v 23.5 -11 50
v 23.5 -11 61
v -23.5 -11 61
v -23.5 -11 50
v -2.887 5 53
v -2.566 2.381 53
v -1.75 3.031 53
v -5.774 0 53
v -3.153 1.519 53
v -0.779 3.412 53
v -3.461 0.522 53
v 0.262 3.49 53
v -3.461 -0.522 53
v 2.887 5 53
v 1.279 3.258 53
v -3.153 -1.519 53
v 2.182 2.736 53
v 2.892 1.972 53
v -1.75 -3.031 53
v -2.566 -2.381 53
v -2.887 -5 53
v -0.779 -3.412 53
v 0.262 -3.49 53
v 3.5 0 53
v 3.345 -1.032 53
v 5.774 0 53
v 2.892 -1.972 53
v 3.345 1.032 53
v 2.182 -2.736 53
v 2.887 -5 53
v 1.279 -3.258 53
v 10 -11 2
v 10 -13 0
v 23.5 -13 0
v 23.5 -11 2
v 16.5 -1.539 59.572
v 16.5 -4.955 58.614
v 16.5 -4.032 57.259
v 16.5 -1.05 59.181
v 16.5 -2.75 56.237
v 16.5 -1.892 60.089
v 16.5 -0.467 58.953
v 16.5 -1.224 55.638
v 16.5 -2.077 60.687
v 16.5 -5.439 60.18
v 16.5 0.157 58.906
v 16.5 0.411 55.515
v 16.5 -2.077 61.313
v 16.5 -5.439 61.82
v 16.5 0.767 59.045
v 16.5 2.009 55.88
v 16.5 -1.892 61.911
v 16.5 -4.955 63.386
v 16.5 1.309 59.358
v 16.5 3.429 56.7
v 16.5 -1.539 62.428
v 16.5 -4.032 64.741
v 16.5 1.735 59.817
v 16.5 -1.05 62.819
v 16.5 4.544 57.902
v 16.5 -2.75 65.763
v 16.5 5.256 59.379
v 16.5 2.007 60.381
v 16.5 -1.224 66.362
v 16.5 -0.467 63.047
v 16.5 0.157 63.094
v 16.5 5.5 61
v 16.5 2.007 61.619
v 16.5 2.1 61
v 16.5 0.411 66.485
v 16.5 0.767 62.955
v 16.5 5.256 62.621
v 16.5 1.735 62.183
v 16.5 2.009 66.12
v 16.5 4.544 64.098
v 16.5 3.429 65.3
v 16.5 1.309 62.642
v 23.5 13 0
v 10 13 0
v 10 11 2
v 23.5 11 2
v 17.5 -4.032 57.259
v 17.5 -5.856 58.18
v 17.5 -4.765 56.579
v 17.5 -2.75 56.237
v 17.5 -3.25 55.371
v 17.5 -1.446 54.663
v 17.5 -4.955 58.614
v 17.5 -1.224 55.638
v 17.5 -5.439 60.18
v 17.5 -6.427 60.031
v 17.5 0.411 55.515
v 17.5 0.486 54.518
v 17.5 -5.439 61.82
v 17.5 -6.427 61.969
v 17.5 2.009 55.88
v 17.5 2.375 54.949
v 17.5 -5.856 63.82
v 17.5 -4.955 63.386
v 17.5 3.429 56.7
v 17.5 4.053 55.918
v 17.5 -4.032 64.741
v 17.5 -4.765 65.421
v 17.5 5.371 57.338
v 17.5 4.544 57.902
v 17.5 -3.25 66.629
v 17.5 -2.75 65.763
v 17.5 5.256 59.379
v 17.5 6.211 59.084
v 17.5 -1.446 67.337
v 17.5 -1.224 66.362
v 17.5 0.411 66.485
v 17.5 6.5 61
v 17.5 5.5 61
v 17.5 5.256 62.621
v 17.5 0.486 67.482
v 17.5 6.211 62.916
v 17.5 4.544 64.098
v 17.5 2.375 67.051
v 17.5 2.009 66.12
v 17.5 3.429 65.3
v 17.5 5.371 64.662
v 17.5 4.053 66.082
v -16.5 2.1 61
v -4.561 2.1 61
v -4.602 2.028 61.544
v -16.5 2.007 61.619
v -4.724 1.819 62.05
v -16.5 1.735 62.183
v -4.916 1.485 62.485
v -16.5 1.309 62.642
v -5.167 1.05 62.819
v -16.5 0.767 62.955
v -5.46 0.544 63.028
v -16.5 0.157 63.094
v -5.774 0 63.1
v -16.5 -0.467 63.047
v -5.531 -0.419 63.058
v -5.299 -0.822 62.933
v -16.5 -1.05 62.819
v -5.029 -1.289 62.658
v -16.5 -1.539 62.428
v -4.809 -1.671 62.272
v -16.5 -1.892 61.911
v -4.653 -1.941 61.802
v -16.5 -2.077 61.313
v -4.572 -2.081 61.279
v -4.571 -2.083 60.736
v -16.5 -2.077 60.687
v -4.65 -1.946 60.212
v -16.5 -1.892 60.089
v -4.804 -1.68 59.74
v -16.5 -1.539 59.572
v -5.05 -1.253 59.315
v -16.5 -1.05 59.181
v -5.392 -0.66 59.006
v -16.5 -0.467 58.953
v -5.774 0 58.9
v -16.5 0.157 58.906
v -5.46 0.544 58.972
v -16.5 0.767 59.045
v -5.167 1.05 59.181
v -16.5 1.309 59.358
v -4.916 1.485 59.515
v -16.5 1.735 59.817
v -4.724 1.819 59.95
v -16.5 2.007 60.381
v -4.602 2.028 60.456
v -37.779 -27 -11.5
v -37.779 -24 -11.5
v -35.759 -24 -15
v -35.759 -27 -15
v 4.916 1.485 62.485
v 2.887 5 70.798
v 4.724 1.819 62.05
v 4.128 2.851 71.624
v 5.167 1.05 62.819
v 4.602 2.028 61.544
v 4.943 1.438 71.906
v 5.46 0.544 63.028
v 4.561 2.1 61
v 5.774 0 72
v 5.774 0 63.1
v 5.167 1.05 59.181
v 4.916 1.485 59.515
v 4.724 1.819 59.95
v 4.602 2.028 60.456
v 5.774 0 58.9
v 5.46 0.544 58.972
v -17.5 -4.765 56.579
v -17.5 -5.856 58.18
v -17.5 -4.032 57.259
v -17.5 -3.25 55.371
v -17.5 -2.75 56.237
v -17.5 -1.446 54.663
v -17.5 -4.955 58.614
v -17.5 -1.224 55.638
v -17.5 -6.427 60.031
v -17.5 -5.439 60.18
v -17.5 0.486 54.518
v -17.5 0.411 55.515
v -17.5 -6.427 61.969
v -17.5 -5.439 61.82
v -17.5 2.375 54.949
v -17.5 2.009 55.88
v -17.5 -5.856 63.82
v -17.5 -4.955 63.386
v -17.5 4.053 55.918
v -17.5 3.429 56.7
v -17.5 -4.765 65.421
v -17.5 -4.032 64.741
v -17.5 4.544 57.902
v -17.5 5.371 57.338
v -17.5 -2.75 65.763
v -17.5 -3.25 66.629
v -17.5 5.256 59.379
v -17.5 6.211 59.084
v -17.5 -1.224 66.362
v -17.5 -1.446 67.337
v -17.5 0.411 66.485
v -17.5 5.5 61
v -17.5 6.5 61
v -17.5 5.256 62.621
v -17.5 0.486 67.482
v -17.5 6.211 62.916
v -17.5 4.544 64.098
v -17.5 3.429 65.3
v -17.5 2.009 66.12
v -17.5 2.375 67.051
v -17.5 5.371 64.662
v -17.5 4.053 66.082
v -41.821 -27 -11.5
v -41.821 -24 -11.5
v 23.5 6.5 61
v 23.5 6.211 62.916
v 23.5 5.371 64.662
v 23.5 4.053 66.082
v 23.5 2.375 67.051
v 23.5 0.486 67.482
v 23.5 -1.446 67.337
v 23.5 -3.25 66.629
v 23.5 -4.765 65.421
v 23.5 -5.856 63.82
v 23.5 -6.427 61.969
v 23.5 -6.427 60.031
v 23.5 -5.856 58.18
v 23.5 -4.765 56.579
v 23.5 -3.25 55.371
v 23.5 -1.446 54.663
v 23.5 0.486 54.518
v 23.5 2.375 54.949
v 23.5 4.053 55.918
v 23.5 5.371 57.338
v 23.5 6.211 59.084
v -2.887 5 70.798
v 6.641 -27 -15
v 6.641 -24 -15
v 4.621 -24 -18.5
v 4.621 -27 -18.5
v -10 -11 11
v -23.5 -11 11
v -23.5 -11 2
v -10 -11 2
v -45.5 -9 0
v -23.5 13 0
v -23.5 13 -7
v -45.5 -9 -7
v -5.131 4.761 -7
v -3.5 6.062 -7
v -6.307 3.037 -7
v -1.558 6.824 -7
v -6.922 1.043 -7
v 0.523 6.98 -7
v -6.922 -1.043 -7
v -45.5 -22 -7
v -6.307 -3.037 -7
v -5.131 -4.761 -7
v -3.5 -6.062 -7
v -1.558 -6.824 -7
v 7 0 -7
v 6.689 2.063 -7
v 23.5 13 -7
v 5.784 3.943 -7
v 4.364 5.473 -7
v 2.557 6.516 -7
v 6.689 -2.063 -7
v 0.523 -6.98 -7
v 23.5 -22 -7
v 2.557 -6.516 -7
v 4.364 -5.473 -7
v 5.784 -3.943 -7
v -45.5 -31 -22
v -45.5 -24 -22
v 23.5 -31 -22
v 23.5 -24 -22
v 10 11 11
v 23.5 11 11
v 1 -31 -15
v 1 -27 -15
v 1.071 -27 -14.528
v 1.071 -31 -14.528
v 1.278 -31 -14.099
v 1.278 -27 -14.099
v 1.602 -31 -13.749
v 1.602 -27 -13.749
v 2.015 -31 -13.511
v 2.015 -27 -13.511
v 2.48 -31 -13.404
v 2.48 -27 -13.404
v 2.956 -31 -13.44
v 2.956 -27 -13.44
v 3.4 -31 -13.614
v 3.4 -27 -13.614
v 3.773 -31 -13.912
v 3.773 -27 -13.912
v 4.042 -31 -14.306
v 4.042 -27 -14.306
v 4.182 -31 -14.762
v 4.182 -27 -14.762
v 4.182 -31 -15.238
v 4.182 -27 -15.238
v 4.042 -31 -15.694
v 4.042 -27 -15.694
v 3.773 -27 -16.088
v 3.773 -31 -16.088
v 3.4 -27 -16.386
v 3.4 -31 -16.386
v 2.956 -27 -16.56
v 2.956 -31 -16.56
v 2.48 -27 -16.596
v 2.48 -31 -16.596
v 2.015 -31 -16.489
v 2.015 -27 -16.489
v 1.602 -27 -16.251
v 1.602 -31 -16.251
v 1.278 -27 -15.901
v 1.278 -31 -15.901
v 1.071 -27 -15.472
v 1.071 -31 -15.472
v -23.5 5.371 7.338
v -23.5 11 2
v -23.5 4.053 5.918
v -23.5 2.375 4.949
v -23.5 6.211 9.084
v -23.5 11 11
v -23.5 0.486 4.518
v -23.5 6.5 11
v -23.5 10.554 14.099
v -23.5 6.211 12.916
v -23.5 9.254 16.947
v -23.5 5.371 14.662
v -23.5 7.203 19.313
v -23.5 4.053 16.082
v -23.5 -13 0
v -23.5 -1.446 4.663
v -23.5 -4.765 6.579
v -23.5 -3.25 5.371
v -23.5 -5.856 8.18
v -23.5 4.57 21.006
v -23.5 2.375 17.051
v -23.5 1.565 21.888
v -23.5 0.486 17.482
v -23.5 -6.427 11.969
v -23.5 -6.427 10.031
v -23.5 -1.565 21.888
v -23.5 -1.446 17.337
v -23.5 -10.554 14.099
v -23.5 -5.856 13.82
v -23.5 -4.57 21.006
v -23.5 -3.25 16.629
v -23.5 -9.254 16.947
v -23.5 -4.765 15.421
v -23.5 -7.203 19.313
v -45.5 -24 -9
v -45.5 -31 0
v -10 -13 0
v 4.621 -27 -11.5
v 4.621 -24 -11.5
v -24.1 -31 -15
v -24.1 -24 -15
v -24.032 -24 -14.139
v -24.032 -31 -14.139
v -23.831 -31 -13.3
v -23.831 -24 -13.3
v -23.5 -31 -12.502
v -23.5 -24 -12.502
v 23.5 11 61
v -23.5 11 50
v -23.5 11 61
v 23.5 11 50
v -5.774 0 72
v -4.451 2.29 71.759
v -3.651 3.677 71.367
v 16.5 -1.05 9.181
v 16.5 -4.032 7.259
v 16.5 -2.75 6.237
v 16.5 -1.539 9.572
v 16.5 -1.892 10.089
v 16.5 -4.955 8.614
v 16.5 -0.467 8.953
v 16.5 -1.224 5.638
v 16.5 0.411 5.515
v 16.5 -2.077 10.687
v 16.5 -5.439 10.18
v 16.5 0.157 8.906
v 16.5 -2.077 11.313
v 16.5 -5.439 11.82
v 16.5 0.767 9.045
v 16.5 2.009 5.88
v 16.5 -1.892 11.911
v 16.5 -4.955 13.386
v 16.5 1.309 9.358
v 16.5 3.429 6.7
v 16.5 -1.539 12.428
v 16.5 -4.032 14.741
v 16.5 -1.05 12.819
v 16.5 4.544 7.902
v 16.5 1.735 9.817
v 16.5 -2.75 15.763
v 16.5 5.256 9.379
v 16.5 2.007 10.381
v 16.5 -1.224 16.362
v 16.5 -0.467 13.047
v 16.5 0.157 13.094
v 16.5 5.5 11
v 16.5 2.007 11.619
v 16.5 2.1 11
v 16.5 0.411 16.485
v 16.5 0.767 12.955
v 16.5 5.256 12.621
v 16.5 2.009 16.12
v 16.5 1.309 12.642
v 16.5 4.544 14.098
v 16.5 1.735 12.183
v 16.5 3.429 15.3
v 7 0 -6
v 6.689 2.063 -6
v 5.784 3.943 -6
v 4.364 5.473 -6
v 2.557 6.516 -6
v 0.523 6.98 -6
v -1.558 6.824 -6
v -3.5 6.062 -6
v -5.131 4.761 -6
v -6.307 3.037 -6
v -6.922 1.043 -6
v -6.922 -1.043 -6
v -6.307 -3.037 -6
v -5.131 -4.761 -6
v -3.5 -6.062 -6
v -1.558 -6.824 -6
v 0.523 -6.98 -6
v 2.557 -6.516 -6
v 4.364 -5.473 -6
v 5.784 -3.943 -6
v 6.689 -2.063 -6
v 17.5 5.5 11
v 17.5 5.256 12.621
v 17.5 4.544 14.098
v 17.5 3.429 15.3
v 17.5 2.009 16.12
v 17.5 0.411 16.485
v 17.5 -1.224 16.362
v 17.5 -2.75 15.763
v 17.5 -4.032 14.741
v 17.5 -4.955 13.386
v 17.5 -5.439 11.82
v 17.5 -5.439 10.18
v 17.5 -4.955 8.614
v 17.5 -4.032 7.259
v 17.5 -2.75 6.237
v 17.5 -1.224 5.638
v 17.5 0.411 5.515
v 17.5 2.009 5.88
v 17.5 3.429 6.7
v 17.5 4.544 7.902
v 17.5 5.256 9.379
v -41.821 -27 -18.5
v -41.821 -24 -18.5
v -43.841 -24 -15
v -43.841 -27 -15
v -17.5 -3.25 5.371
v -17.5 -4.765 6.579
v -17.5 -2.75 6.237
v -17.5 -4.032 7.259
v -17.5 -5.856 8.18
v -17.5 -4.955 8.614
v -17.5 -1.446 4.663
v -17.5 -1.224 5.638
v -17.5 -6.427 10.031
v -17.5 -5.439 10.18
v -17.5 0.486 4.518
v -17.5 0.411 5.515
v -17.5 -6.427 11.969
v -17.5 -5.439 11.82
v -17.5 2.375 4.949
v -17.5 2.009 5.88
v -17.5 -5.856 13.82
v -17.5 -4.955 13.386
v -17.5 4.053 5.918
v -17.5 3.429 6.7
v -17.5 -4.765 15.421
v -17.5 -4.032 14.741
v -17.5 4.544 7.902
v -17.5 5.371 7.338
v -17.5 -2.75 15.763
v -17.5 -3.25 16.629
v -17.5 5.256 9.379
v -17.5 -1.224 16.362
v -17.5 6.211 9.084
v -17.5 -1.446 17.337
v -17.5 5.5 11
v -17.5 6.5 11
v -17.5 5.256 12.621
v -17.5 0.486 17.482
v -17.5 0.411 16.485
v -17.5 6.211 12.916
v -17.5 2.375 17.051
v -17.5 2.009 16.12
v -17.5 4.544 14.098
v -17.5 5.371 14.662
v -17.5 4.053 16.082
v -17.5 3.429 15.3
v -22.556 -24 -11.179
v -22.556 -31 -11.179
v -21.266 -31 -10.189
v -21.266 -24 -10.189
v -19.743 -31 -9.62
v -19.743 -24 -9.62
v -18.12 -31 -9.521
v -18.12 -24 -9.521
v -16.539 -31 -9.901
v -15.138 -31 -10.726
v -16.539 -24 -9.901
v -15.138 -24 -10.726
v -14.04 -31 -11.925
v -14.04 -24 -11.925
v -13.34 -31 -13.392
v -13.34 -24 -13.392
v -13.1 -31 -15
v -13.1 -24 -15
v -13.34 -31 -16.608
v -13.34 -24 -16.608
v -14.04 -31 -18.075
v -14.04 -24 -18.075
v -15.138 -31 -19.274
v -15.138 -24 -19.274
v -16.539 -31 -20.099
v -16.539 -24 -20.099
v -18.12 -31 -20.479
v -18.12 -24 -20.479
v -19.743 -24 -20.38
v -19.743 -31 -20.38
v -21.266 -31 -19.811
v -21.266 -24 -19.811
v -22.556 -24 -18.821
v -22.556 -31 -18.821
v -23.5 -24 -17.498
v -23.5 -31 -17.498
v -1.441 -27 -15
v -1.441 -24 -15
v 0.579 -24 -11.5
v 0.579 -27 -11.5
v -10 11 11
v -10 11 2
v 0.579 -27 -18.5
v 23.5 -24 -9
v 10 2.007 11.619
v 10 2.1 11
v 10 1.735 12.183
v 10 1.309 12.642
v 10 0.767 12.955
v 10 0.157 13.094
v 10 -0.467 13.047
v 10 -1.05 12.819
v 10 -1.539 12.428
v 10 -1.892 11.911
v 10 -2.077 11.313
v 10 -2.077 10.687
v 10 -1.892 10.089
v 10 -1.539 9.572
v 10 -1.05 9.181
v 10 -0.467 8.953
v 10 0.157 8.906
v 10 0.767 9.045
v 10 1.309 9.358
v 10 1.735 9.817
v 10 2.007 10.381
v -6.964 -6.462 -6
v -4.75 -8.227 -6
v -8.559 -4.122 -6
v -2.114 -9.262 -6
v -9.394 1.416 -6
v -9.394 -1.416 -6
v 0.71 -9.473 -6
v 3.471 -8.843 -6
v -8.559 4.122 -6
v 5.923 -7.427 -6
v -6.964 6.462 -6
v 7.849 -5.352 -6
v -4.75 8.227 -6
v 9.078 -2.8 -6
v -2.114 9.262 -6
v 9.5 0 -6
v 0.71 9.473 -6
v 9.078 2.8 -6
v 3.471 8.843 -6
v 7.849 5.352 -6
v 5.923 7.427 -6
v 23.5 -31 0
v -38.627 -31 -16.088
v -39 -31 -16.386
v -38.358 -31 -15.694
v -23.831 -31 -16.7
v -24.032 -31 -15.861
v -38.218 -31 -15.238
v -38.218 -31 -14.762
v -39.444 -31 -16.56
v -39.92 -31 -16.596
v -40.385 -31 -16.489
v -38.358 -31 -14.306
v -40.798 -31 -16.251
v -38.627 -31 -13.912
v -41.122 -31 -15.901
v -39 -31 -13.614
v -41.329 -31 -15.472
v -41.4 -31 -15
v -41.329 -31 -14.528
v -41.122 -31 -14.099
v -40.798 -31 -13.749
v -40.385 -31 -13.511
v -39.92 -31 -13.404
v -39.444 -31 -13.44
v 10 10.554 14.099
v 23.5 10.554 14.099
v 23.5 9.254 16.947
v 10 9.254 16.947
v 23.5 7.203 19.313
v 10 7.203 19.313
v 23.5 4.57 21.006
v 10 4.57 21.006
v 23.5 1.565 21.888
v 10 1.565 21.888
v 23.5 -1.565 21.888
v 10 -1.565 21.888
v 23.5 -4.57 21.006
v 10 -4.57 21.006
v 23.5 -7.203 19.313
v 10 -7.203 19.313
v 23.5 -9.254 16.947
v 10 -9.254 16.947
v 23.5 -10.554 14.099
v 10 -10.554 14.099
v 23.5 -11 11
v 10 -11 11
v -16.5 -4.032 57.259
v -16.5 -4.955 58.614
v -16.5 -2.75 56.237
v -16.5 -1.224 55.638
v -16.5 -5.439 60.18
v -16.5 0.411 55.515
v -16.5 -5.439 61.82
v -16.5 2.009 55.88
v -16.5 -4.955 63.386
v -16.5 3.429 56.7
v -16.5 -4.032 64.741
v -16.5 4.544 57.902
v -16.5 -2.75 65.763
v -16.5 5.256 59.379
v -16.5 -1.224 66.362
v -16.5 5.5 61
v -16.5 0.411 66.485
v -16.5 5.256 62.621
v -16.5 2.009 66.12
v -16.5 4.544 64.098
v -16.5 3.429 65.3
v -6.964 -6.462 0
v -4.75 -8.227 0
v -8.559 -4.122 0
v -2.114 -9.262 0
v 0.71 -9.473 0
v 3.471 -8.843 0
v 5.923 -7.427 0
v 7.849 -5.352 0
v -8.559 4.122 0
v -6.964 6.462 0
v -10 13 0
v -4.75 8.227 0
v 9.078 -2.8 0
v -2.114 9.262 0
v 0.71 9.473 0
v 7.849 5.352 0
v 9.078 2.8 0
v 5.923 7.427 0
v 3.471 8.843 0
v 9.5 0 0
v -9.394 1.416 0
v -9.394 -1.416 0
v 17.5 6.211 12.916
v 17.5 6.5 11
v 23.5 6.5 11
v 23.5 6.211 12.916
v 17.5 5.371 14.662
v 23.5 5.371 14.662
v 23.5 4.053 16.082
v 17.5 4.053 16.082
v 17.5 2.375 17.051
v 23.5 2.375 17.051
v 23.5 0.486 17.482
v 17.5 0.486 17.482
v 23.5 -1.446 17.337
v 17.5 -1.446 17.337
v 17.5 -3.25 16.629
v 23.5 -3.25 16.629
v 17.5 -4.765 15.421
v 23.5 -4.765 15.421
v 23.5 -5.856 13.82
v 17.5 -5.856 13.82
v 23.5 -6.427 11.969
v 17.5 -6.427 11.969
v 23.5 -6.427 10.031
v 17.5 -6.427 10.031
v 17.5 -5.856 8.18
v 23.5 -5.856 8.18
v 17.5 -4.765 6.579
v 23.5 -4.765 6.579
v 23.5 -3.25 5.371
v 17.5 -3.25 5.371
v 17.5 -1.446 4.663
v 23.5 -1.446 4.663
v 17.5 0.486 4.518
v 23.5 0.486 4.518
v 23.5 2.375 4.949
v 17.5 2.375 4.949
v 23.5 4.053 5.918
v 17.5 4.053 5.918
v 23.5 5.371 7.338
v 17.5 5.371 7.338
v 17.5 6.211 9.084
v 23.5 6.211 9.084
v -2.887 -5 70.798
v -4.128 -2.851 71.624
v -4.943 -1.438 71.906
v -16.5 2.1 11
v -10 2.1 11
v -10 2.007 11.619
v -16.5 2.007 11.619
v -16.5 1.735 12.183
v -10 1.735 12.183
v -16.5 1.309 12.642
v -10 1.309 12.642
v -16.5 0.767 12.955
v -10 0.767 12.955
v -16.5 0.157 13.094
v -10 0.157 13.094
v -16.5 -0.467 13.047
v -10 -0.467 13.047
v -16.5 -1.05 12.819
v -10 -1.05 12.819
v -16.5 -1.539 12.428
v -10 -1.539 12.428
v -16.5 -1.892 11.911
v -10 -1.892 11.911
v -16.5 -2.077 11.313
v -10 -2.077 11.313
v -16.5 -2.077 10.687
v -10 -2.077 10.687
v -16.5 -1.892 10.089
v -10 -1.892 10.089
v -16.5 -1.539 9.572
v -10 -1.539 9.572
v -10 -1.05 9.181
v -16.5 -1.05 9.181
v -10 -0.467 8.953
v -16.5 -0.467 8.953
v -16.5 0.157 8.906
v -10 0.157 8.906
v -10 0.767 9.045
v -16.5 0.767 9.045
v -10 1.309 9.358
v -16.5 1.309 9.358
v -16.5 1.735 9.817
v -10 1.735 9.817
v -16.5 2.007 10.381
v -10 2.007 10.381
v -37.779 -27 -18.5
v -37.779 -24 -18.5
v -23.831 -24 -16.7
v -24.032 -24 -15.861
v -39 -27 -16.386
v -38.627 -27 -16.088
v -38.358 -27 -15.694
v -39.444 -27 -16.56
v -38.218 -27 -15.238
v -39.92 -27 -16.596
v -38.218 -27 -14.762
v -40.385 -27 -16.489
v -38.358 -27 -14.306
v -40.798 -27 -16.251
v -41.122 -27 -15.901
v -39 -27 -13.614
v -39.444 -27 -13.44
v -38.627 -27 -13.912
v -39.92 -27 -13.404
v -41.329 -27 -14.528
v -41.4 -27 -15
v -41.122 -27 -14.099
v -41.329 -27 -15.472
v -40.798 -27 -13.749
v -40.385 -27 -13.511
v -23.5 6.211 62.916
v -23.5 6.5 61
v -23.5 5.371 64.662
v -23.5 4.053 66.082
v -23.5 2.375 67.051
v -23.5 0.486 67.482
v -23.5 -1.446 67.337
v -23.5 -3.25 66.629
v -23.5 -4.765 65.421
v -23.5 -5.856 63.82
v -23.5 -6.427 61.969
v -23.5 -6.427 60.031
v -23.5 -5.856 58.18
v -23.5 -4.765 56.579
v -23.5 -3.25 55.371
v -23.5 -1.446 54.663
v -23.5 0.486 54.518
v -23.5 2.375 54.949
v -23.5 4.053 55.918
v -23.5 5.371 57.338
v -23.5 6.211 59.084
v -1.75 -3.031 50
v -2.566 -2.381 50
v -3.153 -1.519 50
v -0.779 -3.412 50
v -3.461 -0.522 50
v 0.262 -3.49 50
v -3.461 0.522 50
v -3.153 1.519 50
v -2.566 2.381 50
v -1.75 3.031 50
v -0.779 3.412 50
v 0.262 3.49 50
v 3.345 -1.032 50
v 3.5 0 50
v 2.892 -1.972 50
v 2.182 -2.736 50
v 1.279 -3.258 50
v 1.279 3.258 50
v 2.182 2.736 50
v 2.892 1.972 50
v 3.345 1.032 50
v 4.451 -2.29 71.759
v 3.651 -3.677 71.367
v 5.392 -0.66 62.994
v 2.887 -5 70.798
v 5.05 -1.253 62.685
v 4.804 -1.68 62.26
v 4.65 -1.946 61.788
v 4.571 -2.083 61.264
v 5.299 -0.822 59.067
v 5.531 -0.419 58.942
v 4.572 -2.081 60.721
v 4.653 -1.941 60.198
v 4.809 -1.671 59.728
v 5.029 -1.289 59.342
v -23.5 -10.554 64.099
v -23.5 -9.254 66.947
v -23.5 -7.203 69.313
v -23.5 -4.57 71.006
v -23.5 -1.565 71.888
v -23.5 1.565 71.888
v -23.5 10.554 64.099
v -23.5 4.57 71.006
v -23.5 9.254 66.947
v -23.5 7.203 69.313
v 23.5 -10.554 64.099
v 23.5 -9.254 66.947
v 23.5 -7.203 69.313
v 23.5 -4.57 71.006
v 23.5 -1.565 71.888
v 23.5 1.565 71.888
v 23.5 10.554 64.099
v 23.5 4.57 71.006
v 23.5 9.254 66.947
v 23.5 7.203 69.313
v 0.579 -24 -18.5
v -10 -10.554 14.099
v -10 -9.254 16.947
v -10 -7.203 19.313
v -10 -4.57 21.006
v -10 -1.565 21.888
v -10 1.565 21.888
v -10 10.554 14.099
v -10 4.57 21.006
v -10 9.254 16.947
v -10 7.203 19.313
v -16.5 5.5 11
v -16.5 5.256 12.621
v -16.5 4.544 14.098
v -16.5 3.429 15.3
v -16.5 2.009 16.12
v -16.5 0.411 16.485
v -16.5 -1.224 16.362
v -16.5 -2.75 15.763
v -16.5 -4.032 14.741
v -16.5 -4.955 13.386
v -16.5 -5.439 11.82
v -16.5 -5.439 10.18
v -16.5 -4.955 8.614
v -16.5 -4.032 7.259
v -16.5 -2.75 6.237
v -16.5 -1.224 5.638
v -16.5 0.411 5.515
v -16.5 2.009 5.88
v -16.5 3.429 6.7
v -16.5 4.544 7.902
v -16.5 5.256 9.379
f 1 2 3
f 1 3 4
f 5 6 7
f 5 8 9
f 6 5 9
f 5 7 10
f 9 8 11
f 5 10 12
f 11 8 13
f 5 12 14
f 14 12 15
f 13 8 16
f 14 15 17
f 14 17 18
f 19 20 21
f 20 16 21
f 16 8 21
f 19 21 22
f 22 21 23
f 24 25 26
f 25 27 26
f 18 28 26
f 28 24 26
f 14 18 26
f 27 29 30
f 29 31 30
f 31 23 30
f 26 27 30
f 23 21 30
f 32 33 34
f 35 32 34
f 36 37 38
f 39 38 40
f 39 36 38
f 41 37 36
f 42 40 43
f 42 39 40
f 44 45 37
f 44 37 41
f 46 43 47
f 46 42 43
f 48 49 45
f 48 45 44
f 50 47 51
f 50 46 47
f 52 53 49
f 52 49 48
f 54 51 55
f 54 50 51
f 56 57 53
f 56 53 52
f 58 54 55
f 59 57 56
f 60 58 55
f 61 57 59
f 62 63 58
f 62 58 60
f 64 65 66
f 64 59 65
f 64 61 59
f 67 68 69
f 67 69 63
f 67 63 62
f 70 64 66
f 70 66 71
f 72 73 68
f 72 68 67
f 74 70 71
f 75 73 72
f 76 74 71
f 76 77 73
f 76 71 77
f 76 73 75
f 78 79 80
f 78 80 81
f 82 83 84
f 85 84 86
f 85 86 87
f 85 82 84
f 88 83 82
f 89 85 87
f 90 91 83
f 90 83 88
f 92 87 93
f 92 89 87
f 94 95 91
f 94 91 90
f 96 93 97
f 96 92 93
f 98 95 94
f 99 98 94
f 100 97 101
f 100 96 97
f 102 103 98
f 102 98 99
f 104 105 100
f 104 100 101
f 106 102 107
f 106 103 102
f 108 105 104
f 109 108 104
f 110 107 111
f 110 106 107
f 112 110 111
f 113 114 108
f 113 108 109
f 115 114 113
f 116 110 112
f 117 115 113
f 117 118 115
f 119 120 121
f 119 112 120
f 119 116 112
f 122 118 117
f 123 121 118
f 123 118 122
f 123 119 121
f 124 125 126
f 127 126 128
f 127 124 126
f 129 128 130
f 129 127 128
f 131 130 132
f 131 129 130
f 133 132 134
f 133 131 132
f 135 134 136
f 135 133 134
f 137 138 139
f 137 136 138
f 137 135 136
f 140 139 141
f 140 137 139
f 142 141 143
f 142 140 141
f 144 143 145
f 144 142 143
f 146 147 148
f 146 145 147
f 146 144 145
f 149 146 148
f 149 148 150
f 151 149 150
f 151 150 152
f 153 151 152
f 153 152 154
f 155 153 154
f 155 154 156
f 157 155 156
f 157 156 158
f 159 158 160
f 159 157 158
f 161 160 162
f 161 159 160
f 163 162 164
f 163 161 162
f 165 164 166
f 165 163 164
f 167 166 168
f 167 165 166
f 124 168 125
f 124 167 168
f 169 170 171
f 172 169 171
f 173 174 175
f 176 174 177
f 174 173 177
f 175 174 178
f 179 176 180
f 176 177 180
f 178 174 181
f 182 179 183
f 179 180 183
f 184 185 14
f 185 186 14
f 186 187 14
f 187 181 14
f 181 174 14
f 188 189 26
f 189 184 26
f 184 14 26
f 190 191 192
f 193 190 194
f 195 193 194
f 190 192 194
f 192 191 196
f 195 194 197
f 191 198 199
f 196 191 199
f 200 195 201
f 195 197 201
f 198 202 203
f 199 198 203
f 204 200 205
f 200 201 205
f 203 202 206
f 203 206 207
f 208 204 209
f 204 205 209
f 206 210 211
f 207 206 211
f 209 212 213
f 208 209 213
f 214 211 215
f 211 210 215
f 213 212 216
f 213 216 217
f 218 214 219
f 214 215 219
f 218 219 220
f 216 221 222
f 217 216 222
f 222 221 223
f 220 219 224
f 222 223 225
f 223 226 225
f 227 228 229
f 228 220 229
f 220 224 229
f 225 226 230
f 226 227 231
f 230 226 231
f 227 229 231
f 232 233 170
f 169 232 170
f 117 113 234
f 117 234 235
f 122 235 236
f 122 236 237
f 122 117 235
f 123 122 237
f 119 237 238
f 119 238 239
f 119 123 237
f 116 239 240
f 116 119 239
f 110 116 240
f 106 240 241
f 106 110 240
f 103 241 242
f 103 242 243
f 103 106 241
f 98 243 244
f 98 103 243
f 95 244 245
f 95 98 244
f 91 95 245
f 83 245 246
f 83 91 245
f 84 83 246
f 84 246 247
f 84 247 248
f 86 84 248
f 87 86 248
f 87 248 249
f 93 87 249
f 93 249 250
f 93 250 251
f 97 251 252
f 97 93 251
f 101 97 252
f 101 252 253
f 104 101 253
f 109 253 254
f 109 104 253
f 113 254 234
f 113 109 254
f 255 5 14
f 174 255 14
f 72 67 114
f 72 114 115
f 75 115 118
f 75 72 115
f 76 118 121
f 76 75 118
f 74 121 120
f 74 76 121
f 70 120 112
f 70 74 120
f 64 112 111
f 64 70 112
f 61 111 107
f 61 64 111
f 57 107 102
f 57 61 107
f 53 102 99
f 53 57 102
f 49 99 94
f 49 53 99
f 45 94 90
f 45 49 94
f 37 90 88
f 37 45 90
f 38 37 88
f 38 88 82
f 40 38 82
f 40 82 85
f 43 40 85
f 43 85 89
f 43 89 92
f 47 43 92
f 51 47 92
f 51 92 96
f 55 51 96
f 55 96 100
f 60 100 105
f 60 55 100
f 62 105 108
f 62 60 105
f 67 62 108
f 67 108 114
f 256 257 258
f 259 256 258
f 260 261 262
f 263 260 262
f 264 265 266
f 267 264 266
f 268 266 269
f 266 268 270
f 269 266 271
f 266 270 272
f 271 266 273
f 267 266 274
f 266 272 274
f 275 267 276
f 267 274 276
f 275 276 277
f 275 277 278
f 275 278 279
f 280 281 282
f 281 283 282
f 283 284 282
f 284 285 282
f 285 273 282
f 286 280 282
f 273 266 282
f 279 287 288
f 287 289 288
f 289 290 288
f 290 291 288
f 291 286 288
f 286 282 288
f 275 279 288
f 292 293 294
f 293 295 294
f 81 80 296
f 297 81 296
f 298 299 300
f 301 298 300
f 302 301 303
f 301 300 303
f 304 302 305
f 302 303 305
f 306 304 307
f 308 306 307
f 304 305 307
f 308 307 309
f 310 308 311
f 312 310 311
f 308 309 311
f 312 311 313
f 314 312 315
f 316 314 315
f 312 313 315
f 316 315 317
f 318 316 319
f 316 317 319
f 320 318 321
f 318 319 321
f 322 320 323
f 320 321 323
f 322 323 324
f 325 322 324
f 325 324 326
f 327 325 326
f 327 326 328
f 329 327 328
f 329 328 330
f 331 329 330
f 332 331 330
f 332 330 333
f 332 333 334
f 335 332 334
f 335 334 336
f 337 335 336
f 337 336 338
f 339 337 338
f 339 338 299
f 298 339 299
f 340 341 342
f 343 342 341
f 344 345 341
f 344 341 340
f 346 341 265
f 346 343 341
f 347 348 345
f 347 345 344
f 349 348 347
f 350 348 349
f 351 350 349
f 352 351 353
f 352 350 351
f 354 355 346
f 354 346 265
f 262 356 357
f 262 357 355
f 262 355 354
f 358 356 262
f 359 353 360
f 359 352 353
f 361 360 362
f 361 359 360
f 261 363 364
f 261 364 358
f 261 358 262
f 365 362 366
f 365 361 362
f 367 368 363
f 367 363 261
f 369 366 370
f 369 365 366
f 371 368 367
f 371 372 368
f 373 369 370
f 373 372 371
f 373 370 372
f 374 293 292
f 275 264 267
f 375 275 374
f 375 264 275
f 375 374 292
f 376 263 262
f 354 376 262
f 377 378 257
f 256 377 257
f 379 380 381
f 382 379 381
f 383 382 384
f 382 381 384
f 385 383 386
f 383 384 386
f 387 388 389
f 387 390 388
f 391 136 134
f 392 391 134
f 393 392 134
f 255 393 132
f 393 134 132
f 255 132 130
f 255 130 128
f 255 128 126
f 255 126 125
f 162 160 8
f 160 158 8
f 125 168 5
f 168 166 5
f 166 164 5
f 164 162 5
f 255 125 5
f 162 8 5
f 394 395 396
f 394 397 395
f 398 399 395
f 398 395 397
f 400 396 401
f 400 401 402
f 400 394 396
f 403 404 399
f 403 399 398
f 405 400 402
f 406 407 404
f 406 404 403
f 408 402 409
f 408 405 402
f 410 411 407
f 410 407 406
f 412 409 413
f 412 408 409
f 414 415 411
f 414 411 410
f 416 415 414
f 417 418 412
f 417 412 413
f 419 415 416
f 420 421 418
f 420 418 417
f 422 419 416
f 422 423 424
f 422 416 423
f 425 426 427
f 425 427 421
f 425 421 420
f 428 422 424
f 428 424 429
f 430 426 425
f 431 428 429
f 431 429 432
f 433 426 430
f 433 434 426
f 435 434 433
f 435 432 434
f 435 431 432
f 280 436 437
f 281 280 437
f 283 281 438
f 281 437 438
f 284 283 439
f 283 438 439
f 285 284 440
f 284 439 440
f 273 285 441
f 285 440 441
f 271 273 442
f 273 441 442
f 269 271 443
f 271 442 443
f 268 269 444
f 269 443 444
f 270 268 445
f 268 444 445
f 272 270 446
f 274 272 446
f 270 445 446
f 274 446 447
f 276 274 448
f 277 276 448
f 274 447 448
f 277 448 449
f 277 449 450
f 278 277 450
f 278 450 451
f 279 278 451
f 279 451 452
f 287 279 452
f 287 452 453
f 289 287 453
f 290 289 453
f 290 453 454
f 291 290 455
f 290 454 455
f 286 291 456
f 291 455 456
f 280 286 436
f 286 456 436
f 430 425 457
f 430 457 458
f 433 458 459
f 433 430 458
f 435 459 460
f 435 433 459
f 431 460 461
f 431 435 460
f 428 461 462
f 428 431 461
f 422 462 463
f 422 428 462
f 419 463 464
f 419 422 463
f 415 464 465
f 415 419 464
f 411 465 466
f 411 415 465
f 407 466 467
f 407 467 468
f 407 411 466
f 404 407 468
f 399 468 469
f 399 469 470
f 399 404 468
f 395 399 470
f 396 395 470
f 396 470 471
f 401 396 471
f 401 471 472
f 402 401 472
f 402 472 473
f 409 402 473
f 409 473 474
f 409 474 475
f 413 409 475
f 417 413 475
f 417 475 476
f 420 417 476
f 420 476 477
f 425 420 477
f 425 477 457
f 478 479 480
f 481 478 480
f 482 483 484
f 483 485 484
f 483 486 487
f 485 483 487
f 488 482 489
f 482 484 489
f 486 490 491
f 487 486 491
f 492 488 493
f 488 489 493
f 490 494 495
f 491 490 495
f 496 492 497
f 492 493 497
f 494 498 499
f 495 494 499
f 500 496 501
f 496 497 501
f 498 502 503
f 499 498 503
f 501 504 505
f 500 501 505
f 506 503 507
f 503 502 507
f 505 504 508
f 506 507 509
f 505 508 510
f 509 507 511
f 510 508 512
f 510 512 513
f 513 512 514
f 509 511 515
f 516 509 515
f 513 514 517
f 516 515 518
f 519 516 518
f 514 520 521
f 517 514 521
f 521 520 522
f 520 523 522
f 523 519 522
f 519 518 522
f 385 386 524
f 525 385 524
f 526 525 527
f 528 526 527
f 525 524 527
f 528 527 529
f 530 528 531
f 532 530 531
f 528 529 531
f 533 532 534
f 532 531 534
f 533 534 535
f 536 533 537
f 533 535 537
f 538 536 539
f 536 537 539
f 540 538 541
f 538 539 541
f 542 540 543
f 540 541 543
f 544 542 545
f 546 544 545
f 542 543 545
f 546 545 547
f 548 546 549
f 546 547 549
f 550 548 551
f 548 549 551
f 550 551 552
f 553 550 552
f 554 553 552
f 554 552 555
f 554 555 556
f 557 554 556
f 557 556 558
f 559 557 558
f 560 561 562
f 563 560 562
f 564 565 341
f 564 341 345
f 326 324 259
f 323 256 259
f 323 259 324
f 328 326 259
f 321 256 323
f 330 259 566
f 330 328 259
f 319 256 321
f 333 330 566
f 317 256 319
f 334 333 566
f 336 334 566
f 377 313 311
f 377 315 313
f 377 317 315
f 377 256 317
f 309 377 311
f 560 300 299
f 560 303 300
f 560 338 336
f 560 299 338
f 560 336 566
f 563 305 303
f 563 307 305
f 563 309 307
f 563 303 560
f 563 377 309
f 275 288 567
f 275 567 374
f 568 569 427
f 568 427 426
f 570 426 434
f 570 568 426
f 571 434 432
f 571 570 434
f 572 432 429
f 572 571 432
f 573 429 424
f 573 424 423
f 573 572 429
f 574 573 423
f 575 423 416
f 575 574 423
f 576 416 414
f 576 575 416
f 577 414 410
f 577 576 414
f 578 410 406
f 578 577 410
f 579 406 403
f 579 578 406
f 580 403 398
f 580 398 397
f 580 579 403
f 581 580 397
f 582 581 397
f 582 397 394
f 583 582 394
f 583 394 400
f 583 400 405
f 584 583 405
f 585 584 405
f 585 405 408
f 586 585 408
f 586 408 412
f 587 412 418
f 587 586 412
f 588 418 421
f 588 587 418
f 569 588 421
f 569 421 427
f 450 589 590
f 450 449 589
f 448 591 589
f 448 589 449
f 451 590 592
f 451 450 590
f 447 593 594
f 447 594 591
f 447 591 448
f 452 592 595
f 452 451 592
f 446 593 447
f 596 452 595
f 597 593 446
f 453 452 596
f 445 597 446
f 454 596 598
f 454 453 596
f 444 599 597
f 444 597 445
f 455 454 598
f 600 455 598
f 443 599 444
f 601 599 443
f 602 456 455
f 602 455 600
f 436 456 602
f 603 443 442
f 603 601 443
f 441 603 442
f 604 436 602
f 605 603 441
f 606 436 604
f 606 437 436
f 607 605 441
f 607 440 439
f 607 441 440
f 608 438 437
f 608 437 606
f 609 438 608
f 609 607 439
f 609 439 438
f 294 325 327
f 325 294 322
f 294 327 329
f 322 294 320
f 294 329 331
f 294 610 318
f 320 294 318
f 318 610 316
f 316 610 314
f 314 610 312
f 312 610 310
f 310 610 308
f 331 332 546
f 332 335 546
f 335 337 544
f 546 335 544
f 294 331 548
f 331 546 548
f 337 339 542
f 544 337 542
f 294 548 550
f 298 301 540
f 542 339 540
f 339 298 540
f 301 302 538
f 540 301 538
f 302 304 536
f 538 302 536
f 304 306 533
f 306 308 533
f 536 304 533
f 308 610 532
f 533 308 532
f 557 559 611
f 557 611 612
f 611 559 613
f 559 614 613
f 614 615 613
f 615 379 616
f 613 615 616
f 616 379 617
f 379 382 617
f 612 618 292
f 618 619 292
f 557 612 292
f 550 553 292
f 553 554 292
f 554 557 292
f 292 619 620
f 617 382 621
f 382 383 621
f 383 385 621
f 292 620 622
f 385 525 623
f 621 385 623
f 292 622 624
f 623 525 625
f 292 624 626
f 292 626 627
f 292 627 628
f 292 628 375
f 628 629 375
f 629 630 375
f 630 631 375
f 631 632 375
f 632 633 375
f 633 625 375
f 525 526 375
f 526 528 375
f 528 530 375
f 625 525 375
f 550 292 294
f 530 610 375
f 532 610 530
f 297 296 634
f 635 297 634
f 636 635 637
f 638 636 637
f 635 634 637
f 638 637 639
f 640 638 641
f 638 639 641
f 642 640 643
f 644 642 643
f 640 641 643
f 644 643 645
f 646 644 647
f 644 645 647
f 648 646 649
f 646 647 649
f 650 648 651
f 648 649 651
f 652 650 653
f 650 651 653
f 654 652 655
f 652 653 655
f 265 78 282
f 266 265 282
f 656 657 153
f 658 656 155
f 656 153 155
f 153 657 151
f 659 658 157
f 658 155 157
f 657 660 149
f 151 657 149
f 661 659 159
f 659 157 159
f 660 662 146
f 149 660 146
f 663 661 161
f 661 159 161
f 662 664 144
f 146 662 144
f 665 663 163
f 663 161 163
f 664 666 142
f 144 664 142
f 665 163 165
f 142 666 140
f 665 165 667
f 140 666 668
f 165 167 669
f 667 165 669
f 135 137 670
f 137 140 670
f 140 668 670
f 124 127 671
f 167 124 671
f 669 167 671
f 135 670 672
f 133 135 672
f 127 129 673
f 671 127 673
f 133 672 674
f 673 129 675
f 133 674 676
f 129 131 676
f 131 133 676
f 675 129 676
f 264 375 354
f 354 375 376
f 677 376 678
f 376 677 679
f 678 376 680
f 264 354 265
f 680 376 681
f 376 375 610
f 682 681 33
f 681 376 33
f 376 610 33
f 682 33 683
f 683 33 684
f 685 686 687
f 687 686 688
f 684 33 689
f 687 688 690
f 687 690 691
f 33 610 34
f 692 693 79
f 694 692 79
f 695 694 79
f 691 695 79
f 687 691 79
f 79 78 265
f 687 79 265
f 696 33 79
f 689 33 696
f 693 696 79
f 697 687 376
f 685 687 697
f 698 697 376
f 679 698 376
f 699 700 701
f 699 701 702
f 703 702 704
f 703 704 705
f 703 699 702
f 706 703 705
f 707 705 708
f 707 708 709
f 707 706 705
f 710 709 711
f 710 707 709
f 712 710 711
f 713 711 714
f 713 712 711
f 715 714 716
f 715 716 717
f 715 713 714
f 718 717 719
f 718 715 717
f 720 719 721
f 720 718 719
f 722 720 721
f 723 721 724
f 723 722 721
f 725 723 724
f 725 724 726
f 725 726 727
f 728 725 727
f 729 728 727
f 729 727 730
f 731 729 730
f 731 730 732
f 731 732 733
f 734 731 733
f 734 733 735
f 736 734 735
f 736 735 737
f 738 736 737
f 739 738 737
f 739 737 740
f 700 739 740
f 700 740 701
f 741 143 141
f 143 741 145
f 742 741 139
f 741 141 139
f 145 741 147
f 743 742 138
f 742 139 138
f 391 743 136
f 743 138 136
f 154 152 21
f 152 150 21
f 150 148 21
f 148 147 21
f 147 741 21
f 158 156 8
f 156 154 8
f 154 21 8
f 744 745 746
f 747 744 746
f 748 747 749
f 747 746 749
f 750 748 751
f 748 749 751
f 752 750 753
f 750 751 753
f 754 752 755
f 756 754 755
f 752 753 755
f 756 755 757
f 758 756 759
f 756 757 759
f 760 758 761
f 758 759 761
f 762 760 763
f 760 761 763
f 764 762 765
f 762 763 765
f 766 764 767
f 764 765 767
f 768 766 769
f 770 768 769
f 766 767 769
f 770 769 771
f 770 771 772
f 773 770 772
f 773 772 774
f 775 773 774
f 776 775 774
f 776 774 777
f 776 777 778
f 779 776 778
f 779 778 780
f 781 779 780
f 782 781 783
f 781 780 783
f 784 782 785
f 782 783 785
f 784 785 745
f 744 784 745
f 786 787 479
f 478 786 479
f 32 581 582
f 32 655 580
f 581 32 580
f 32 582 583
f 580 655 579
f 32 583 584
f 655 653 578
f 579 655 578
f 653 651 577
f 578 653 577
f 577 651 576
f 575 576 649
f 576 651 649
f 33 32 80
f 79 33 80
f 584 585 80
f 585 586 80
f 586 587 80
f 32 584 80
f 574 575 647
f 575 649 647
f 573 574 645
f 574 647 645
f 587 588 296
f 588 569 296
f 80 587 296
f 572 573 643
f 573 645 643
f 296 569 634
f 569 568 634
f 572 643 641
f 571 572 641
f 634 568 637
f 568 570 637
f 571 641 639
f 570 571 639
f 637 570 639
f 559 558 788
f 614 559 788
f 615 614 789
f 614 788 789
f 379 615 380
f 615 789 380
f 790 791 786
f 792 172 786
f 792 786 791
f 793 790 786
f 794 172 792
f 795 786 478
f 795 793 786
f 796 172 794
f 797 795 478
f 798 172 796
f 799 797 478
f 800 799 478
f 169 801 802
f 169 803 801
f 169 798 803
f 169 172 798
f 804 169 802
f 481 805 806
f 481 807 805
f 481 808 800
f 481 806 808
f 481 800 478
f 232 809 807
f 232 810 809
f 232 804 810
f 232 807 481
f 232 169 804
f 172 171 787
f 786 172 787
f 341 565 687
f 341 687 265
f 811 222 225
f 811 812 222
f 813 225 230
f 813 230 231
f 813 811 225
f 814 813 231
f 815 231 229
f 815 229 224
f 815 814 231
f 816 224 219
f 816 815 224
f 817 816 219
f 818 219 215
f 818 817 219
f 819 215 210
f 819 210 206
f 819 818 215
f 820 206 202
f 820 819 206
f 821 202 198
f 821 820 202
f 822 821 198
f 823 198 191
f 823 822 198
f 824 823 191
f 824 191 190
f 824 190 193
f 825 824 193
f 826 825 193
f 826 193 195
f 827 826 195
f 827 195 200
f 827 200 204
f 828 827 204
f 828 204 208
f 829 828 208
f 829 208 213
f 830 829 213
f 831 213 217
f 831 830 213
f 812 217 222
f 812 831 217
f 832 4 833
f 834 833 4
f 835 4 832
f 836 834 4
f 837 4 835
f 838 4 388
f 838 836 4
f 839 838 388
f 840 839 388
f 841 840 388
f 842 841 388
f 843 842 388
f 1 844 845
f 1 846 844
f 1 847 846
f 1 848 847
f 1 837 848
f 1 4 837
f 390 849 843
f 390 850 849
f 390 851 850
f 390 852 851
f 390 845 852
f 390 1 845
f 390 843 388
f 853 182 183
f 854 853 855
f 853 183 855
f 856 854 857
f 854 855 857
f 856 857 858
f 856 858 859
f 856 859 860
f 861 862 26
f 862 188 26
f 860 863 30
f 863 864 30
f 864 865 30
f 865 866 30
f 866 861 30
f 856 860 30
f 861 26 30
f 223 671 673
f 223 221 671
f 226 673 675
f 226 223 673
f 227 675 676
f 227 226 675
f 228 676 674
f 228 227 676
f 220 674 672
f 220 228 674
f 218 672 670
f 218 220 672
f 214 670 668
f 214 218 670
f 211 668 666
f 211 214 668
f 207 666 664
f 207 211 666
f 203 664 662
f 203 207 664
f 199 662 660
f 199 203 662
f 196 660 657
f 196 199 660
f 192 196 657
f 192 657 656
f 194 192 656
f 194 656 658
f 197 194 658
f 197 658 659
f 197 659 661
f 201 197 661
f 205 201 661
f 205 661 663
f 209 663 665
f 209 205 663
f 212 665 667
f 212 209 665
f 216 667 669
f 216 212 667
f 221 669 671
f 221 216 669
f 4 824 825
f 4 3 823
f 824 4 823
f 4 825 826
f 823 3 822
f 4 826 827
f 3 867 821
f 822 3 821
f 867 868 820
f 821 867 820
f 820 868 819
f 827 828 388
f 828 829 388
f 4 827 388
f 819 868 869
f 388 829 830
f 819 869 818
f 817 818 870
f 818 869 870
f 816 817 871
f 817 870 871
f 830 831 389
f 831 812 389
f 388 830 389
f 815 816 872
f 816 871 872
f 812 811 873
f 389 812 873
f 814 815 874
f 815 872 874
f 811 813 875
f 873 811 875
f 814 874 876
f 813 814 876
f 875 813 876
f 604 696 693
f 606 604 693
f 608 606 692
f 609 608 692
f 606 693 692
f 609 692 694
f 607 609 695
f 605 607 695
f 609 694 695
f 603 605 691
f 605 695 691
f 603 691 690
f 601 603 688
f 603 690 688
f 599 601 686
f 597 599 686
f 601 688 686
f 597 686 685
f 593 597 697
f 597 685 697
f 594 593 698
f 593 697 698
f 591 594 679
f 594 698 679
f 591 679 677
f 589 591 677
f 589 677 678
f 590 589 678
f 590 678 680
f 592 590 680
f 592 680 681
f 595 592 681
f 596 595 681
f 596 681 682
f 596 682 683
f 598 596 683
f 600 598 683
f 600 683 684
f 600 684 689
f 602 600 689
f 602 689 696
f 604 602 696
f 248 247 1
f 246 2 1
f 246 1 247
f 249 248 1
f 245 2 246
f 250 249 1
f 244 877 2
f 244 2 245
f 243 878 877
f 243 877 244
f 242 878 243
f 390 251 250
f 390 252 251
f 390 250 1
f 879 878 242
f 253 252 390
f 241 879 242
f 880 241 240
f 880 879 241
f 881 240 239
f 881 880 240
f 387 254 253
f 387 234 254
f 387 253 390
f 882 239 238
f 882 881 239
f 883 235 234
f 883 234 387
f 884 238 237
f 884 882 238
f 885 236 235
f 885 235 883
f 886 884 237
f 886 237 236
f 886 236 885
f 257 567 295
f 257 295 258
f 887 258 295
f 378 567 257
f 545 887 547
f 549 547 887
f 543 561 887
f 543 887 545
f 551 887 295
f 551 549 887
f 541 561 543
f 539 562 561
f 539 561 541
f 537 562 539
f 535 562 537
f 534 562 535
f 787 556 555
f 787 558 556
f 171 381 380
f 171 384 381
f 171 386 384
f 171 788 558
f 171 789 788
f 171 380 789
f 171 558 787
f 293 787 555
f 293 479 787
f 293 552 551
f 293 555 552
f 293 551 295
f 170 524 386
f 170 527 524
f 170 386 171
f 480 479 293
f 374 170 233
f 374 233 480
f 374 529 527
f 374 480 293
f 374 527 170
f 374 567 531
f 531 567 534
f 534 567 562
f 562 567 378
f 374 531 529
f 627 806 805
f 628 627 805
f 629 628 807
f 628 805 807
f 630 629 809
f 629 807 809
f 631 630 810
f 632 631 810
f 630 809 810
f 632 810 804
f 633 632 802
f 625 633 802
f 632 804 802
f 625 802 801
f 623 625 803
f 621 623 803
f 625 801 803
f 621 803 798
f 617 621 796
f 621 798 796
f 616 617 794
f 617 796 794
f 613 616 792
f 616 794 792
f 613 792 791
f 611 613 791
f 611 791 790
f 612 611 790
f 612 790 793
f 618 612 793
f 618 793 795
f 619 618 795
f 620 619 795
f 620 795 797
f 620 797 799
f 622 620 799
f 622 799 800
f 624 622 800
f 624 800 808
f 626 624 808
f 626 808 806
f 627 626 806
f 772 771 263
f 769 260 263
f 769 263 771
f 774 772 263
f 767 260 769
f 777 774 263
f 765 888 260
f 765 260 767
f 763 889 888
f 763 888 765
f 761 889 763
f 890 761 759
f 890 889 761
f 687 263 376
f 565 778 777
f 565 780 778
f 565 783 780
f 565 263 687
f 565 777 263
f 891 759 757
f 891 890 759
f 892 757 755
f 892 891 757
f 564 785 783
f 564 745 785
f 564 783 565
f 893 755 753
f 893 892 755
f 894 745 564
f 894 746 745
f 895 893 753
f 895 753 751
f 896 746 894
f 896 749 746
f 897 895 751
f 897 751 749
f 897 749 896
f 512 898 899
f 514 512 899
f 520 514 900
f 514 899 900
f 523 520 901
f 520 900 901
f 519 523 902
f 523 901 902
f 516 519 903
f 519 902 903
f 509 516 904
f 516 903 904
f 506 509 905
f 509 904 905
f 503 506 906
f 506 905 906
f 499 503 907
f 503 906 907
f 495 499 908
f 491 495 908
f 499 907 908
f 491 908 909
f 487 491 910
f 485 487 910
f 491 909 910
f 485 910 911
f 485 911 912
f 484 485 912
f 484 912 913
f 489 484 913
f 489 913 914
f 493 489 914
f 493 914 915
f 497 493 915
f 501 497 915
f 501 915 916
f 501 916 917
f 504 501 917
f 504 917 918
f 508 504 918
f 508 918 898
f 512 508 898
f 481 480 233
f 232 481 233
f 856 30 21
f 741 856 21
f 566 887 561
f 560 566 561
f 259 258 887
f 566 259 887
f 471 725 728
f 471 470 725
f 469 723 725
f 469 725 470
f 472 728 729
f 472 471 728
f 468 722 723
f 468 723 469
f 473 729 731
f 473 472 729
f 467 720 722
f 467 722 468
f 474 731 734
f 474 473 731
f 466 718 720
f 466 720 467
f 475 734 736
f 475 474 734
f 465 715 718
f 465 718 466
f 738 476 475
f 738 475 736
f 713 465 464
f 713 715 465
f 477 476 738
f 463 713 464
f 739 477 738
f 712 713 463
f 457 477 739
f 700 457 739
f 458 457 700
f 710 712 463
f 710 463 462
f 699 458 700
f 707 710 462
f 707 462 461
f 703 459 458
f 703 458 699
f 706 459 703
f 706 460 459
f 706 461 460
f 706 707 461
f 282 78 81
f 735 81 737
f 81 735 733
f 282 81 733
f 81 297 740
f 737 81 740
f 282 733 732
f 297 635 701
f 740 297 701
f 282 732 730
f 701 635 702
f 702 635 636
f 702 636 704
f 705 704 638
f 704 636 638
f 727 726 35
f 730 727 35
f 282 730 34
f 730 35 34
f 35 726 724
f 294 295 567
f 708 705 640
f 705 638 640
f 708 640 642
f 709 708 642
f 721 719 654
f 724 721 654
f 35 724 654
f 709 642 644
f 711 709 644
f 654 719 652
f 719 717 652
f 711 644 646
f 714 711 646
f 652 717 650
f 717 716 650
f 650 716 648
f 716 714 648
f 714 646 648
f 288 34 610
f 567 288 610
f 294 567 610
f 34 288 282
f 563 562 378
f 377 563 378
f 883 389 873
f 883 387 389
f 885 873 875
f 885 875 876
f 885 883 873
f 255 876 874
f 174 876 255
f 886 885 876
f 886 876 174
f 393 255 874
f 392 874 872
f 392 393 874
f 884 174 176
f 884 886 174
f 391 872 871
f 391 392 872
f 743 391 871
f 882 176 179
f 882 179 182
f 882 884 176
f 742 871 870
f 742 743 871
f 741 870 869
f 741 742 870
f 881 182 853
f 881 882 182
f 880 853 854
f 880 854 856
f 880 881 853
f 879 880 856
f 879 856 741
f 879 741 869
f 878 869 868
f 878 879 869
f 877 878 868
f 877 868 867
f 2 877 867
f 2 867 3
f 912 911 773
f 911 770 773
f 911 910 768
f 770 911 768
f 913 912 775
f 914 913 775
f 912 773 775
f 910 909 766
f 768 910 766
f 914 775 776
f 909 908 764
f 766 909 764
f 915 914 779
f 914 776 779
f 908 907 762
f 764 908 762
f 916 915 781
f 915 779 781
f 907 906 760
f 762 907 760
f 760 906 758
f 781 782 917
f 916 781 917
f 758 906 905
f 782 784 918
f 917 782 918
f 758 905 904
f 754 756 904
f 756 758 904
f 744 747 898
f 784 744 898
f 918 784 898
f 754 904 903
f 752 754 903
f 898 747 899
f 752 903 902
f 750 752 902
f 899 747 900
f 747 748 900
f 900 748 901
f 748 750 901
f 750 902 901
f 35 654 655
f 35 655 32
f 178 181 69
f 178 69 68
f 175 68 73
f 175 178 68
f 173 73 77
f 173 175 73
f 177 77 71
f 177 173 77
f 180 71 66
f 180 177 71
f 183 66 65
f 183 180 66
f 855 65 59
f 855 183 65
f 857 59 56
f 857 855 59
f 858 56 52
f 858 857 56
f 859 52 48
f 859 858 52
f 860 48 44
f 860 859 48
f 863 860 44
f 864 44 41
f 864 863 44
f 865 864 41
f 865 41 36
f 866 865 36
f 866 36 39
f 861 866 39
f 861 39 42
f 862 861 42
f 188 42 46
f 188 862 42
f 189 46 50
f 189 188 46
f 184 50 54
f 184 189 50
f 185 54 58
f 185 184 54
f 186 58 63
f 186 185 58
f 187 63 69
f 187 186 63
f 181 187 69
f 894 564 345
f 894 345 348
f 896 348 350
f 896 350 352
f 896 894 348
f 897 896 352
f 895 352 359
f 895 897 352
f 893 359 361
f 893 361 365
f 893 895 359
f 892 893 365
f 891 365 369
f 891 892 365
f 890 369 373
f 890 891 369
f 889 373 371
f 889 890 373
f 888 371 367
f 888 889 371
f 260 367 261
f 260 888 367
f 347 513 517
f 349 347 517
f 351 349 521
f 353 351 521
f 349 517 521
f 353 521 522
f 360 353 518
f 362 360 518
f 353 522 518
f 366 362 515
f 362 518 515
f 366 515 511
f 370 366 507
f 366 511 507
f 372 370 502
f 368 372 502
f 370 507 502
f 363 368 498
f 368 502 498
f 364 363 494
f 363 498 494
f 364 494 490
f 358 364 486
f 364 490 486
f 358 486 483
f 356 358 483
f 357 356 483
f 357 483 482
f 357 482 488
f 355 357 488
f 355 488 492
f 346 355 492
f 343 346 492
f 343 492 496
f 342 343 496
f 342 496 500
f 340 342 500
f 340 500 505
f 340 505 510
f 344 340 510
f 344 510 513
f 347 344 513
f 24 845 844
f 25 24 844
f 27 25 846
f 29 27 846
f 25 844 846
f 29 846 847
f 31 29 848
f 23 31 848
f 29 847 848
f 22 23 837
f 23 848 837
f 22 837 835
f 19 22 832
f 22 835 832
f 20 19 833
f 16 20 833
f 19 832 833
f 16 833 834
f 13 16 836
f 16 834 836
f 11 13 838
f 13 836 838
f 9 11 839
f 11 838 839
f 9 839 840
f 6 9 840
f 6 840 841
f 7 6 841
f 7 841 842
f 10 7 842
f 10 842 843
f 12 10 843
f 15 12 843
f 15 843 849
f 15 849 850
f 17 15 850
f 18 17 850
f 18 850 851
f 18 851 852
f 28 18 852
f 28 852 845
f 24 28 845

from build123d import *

# Parameters (mm, degrees)
F0_R      = 9.5
F1_DEPTH  = 7
F2_START  = -6
F0_R_2    = 7
F2_DEPTH  = 1
F3_W      = 47
F3_H      = 7
F4_DEPTH  = 14
F6_W      = 7
F6_H      = 14
F7_DEPTH  = 22
F9_START  = 10
F8_R      = 6.5
F9_DEPTH  = 13.5
F10_START = -10
F10_DEPTH = 13.5
F11_START = 10
F8_R_2    = 5.5
F11_DEPTH = 7.5
F12_START = -10
F12_DEPTH = 7.5
F13_START = -10
F8_R_3    = 2.1
F13_DEPTH = 6.5
F15_DEPTH = 22
F5_R      = 1.6
F5_R_2    = 4.85
F16_DEPTH = 25
F17_R     = 1.6
F18_DEPTH = 3
F19_DEPTH = 1
F20_SIZE  = 1.99999
F21_SIZE  = 22
F22_R     = 6.5
F23_DEPTH = 23.5
F22_R_2   = 5.5
F24_DEPTH = 17.5
F25_START = 10
F25_DEPTH = 6.5
F22_R_3   = 2.1
F26_DEPTH = 16.5
F28_START = -3
F27_R     = 3.5
F28_DEPTH = 22
F29_DEPTH = 25


# Not quite as in the source:
# - a fillet or chamfer is up to 0.001 mm smaller than in the source, because OpenCascade refuses the exact size


with BuildPart() as f1:
    # F0 (on Top) → F1 (new body)
    with BuildSketch(Plane.XY):
        Polygon((-23.5, 13), (-23.5, 0), (-23.5, -31), (23.5, -31), (23.5, 0), (23.5, 13), align=None)
        Circle(F0_R, mode=Mode.SUBTRACT)
    extrude(amount=-F1_DEPTH)

    # F0 (on Top) → F2 (join)
    with BuildSketch(Plane.XY.offset(F2_START)):
        Circle(F0_R)
        Circle(F0_R_2, mode=Mode.SUBTRACT)
    extrude(amount=-F2_DEPTH)

    # F3 (on face) → F4 (join)
    with BuildSketch(Plane(origin=(0, 0, -7), x_dir=(1, 0, 0), z_dir=(0, 0, -1))):
        with Locations((0, 27.5)):
            Rectangle(F3_W, F3_H)
    extrude(amount=F4_DEPTH)

    # F6 (on face) → F7 (join)
    with BuildSketch(Plane(origin=(-23.5, 0, 0), x_dir=(0, -1, 0), z_dir=(-1, 0, 0))):
        with Locations((27.5, -14)):
            Rectangle(F6_W, F6_H)
    extrude(amount=F7_DEPTH)

    # F8 (on Right) → F9 (join)
    with BuildSketch(Plane.YZ.offset(F9_START)):
        with BuildLine():
            Line((11, 0), (11, 11))
            ThreePointArc((11, 11), (7.7781745931, 3.2218254069), (0, 0))
            Line((0, 0), (11, 0))
        make_face()
        with BuildLine():
            ThreePointArc((0, 0), (-7.7781745931, 3.2218254069), (-11, 11))
            Line((-11, 11), (-11, 0))
            Line((-11, 0), (0, 0))
        make_face()
        with BuildLine():
            ThreePointArc((0, 0), (7.7781745931, 3.2218254069), (11, 11))
            ThreePointArc((11, 11), (0, 22), (-11, 11))
            ThreePointArc((-11, 11), (-7.7781745931, 3.2218254069), (0, 0))
        make_face()
        with Locations((0, 11)):
            Circle(F8_R, mode=Mode.SUBTRACT)
    extrude(amount=F9_DEPTH)

    # F8 (on Right) → F10 (join)
    with BuildSketch(Plane.YZ.offset(F10_START)):
        with BuildLine():
            ThreePointArc((0, 0), (-7.7781745931, 3.2218254069), (-11, 11))
            Line((-11, 11), (-11, 0))
            Line((-11, 0), (0, 0))
        make_face()
        with BuildLine():
            Line((11, 0), (11, 11))
            ThreePointArc((11, 11), (7.7781745931, 3.2218254069), (0, 0))
            Line((0, 0), (11, 0))
        make_face()
        with BuildLine():
            ThreePointArc((0, 0), (7.7781745931, 3.2218254069), (11, 11))
            ThreePointArc((11, 11), (0, 22), (-11, 11))
            ThreePointArc((-11, 11), (-7.7781745931, 3.2218254069), (0, 0))
        make_face()
        with Locations((0, 11)):
            Circle(F8_R, mode=Mode.SUBTRACT)
    extrude(amount=-F10_DEPTH)

    # F8 (on Right) → F11 (join)
    with BuildSketch(Plane.YZ.offset(F11_START)):
        with Locations((0, 11)):
            Circle(F8_R)
        with Locations((0, 11)):
            Circle(F8_R_2, mode=Mode.SUBTRACT)
    extrude(amount=F11_DEPTH)

    # F8 (on Right) → F12 (join)
    with BuildSketch(Plane.YZ.offset(F12_START)):
        with Locations((0, 11)):
            Circle(F8_R)
        with Locations((0, 11)):
            Circle(F8_R_2, mode=Mode.SUBTRACT)
    extrude(amount=-F12_DEPTH)

    # F8 (on Right) → F13 (join)
    with BuildSketch(Plane.YZ.offset(F13_START)):
        with Locations((0, 11)):
            Circle(F8_R_2)
        with Locations((0, 11)):
            Circle(F8_R_3, mode=Mode.SUBTRACT)
    extrude(amount=-F13_DEPTH)

    # F14 (on face) → F15 (join)
    with BuildSketch(Plane(origin=(-23.5, 0, 0), x_dir=(0, -1, 0), z_dir=(-1, 0, 0))):
        Polygon((-11, 0), (-13, 0), (-13, -7), (24, -7), (31, -7), (31, 0), (11, 0), align=None)
    extrude(amount=F15_DEPTH)

    # F5 (on face) → F16 (cut)
    with BuildSketch(Plane(origin=(0, -24, 0), x_dir=(-1, 0, 0), z_dir=(0, 1, 0))):
        with Locations((-2.6, -15)):
            Circle(F5_R)
        with Locations((39.8, -15)):
            Circle(F5_R)
        with BuildLine():
            Line((23.5, -17.4979991994), (23.5, -12.5020008006))
            ThreePointArc((23.5, -12.5020008006), (13.1, -15), (23.5, -17.4979991994))
        make_face()
        with Locations((18.6, -15)):
            Circle(F5_R_2, mode=Mode.SUBTRACT)
        with Locations((18.6, -15)):
            Circle(F5_R_2)
        with BuildLine():
            ThreePointArc((23.5, -17.4979991994), (23.9478967828, -16.2845232579), (24.1, -15))
            ThreePointArc((24.1, -15), (23.9478967828, -13.7154767421), (23.5, -12.5020008006))
            Line((23.5, -12.5020008006), (23.5, -17.4979991994))
        make_face()
    extrude(amount=-F16_DEPTH, mode=Mode.SUBTRACT)

    # F17 (on face) → F18 (cut)
    with BuildSketch(Plane(origin=(0, -24, 0), x_dir=(-1, 0, 0), z_dir=(0, 1, 0))):
        Polygon((-4.6207259422, -18.5), (-0.5792740578, -18.5), (1.4414518843, -15), (-0.5792740578, -11.5), (-4.6207259422, -11.5), (-6.6414518843, -15), align=None)
        with Locations((-2.6, -15)):
            Circle(F17_R, mode=Mode.SUBTRACT)
        Polygon((37.7792740578, -18.5), (41.8207259422, -18.5), (43.8414518843, -15), (41.8207259422, -11.5), (37.7792740578, -11.5), (35.7585481157, -15), align=None)
        with Locations((39.8, -15)):
            Circle(F17_R, mode=Mode.SUBTRACT)
    extrude(amount=-F18_DEPTH, mode=Mode.SUBTRACT)

    # F19 (add): a face of the model
    f19_faces = [f1.faces().sort_by_distance(p)[0] for p in [
        (-11, -27.5, -21),
    ]]
    extrude(f19_faces, amount=F19_DEPTH)

    # F20 (size 2 in the source; OpenCascade refuses exactly that, so slightly less here)
    f20_edges = [f1.edges().sort_by_distance(p)[0] for p in [
        (-11, -24, -7),
        (-16.75, 11, 0),
        (16.75, 11, 0),
        (16.75, -11, 0),
        (-16.75, -11, 0),
    ]]
    chamfer(f20_edges, length=F20_SIZE)

    # F21
    f21_edges = [f1.edges().sort_by_distance(p)[0] for p in [
        (-45.5, 13, -3.5),
    ]]
    chamfer(f21_edges, length=F21_SIZE)

    # F8 (on Right) → F25 (join)
    with BuildSketch(Plane.YZ.offset(F25_START)):
        with Locations((0, 11)):
            Circle(F8_R_2)
        with Locations((0, 11)):
            Circle(F8_R_3, mode=Mode.SUBTRACT)
    extrude(amount=F25_DEPTH)


with BuildPart() as f23:
    # F22 (on Right) → F23 (new body, symmetric)
    with BuildSketch(Plane.YZ):
        with BuildLine():
            ThreePointArc((0, 50), (7.7781745931, 53.2218254069), (11, 61))
            ThreePointArc((11, 61), (0, 72), (-11, 61))
            ThreePointArc((-11, 61), (-7.7781745931, 53.2218254069), (0, 50))
        make_face()
        with Locations((0, 61)):
            Circle(F22_R, mode=Mode.SUBTRACT)
        with BuildLine():
            ThreePointArc((0, 50), (-7.7781745931, 53.2218254069), (-11, 61))
            Line((-11, 61), (-11, 50))
            Line((-11, 50), (0, 50))
        make_face()
        with BuildLine():
            Line((11, 50), (11, 61))
            ThreePointArc((11, 61), (7.7781745931, 53.2218254069), (0, 50))
            Line((0, 50), (11, 50))
        make_face()
    extrude(amount=F23_DEPTH, both=True)

    # F22 (on Right) → F24 (join, symmetric)
    with BuildSketch(Plane.YZ):
        with Locations((0, 61)):
            Circle(F22_R)
        with Locations((0, 61)):
            Circle(F22_R_2, mode=Mode.SUBTRACT)
    extrude(amount=F24_DEPTH, both=True)

    # F22 (on Right) → F26 (join, symmetric)
    with BuildSketch(Plane.YZ):
        with Locations((0, 61)):
            Circle(F22_R_2)
        with Locations((0, 61)):
            Circle(F22_R_3, mode=Mode.SUBTRACT)
    extrude(amount=F26_DEPTH, both=True)

    # F27 (on face) → F28 (cut)
    with BuildSketch(Plane(origin=(0, 0, 50), x_dir=(1, 0, 0), z_dir=(0, 0, -1)).offset(F28_START)):
        Polygon((-2.8867513459, -5), (2.8867513459, -5), (5.7735026919, 0), (2.8867513459, 5), (-2.8867513459, 5), (-5.7735026919, 0), align=None)
        Circle(F27_R, mode=Mode.SUBTRACT)
        Circle(F27_R)
    extrude(amount=-F28_DEPTH, mode=Mode.SUBTRACT)

    # F27 (on face) → F29 (cut)
    with BuildSketch(Plane(origin=(0, 0, 50), x_dir=(1, 0, 0), z_dir=(0, 0, -1))):
        Circle(F27_R)
    extrude(amount=-F29_DEPTH, mode=Mode.SUBTRACT)


solid = Compound([f1.part, f23.part])
